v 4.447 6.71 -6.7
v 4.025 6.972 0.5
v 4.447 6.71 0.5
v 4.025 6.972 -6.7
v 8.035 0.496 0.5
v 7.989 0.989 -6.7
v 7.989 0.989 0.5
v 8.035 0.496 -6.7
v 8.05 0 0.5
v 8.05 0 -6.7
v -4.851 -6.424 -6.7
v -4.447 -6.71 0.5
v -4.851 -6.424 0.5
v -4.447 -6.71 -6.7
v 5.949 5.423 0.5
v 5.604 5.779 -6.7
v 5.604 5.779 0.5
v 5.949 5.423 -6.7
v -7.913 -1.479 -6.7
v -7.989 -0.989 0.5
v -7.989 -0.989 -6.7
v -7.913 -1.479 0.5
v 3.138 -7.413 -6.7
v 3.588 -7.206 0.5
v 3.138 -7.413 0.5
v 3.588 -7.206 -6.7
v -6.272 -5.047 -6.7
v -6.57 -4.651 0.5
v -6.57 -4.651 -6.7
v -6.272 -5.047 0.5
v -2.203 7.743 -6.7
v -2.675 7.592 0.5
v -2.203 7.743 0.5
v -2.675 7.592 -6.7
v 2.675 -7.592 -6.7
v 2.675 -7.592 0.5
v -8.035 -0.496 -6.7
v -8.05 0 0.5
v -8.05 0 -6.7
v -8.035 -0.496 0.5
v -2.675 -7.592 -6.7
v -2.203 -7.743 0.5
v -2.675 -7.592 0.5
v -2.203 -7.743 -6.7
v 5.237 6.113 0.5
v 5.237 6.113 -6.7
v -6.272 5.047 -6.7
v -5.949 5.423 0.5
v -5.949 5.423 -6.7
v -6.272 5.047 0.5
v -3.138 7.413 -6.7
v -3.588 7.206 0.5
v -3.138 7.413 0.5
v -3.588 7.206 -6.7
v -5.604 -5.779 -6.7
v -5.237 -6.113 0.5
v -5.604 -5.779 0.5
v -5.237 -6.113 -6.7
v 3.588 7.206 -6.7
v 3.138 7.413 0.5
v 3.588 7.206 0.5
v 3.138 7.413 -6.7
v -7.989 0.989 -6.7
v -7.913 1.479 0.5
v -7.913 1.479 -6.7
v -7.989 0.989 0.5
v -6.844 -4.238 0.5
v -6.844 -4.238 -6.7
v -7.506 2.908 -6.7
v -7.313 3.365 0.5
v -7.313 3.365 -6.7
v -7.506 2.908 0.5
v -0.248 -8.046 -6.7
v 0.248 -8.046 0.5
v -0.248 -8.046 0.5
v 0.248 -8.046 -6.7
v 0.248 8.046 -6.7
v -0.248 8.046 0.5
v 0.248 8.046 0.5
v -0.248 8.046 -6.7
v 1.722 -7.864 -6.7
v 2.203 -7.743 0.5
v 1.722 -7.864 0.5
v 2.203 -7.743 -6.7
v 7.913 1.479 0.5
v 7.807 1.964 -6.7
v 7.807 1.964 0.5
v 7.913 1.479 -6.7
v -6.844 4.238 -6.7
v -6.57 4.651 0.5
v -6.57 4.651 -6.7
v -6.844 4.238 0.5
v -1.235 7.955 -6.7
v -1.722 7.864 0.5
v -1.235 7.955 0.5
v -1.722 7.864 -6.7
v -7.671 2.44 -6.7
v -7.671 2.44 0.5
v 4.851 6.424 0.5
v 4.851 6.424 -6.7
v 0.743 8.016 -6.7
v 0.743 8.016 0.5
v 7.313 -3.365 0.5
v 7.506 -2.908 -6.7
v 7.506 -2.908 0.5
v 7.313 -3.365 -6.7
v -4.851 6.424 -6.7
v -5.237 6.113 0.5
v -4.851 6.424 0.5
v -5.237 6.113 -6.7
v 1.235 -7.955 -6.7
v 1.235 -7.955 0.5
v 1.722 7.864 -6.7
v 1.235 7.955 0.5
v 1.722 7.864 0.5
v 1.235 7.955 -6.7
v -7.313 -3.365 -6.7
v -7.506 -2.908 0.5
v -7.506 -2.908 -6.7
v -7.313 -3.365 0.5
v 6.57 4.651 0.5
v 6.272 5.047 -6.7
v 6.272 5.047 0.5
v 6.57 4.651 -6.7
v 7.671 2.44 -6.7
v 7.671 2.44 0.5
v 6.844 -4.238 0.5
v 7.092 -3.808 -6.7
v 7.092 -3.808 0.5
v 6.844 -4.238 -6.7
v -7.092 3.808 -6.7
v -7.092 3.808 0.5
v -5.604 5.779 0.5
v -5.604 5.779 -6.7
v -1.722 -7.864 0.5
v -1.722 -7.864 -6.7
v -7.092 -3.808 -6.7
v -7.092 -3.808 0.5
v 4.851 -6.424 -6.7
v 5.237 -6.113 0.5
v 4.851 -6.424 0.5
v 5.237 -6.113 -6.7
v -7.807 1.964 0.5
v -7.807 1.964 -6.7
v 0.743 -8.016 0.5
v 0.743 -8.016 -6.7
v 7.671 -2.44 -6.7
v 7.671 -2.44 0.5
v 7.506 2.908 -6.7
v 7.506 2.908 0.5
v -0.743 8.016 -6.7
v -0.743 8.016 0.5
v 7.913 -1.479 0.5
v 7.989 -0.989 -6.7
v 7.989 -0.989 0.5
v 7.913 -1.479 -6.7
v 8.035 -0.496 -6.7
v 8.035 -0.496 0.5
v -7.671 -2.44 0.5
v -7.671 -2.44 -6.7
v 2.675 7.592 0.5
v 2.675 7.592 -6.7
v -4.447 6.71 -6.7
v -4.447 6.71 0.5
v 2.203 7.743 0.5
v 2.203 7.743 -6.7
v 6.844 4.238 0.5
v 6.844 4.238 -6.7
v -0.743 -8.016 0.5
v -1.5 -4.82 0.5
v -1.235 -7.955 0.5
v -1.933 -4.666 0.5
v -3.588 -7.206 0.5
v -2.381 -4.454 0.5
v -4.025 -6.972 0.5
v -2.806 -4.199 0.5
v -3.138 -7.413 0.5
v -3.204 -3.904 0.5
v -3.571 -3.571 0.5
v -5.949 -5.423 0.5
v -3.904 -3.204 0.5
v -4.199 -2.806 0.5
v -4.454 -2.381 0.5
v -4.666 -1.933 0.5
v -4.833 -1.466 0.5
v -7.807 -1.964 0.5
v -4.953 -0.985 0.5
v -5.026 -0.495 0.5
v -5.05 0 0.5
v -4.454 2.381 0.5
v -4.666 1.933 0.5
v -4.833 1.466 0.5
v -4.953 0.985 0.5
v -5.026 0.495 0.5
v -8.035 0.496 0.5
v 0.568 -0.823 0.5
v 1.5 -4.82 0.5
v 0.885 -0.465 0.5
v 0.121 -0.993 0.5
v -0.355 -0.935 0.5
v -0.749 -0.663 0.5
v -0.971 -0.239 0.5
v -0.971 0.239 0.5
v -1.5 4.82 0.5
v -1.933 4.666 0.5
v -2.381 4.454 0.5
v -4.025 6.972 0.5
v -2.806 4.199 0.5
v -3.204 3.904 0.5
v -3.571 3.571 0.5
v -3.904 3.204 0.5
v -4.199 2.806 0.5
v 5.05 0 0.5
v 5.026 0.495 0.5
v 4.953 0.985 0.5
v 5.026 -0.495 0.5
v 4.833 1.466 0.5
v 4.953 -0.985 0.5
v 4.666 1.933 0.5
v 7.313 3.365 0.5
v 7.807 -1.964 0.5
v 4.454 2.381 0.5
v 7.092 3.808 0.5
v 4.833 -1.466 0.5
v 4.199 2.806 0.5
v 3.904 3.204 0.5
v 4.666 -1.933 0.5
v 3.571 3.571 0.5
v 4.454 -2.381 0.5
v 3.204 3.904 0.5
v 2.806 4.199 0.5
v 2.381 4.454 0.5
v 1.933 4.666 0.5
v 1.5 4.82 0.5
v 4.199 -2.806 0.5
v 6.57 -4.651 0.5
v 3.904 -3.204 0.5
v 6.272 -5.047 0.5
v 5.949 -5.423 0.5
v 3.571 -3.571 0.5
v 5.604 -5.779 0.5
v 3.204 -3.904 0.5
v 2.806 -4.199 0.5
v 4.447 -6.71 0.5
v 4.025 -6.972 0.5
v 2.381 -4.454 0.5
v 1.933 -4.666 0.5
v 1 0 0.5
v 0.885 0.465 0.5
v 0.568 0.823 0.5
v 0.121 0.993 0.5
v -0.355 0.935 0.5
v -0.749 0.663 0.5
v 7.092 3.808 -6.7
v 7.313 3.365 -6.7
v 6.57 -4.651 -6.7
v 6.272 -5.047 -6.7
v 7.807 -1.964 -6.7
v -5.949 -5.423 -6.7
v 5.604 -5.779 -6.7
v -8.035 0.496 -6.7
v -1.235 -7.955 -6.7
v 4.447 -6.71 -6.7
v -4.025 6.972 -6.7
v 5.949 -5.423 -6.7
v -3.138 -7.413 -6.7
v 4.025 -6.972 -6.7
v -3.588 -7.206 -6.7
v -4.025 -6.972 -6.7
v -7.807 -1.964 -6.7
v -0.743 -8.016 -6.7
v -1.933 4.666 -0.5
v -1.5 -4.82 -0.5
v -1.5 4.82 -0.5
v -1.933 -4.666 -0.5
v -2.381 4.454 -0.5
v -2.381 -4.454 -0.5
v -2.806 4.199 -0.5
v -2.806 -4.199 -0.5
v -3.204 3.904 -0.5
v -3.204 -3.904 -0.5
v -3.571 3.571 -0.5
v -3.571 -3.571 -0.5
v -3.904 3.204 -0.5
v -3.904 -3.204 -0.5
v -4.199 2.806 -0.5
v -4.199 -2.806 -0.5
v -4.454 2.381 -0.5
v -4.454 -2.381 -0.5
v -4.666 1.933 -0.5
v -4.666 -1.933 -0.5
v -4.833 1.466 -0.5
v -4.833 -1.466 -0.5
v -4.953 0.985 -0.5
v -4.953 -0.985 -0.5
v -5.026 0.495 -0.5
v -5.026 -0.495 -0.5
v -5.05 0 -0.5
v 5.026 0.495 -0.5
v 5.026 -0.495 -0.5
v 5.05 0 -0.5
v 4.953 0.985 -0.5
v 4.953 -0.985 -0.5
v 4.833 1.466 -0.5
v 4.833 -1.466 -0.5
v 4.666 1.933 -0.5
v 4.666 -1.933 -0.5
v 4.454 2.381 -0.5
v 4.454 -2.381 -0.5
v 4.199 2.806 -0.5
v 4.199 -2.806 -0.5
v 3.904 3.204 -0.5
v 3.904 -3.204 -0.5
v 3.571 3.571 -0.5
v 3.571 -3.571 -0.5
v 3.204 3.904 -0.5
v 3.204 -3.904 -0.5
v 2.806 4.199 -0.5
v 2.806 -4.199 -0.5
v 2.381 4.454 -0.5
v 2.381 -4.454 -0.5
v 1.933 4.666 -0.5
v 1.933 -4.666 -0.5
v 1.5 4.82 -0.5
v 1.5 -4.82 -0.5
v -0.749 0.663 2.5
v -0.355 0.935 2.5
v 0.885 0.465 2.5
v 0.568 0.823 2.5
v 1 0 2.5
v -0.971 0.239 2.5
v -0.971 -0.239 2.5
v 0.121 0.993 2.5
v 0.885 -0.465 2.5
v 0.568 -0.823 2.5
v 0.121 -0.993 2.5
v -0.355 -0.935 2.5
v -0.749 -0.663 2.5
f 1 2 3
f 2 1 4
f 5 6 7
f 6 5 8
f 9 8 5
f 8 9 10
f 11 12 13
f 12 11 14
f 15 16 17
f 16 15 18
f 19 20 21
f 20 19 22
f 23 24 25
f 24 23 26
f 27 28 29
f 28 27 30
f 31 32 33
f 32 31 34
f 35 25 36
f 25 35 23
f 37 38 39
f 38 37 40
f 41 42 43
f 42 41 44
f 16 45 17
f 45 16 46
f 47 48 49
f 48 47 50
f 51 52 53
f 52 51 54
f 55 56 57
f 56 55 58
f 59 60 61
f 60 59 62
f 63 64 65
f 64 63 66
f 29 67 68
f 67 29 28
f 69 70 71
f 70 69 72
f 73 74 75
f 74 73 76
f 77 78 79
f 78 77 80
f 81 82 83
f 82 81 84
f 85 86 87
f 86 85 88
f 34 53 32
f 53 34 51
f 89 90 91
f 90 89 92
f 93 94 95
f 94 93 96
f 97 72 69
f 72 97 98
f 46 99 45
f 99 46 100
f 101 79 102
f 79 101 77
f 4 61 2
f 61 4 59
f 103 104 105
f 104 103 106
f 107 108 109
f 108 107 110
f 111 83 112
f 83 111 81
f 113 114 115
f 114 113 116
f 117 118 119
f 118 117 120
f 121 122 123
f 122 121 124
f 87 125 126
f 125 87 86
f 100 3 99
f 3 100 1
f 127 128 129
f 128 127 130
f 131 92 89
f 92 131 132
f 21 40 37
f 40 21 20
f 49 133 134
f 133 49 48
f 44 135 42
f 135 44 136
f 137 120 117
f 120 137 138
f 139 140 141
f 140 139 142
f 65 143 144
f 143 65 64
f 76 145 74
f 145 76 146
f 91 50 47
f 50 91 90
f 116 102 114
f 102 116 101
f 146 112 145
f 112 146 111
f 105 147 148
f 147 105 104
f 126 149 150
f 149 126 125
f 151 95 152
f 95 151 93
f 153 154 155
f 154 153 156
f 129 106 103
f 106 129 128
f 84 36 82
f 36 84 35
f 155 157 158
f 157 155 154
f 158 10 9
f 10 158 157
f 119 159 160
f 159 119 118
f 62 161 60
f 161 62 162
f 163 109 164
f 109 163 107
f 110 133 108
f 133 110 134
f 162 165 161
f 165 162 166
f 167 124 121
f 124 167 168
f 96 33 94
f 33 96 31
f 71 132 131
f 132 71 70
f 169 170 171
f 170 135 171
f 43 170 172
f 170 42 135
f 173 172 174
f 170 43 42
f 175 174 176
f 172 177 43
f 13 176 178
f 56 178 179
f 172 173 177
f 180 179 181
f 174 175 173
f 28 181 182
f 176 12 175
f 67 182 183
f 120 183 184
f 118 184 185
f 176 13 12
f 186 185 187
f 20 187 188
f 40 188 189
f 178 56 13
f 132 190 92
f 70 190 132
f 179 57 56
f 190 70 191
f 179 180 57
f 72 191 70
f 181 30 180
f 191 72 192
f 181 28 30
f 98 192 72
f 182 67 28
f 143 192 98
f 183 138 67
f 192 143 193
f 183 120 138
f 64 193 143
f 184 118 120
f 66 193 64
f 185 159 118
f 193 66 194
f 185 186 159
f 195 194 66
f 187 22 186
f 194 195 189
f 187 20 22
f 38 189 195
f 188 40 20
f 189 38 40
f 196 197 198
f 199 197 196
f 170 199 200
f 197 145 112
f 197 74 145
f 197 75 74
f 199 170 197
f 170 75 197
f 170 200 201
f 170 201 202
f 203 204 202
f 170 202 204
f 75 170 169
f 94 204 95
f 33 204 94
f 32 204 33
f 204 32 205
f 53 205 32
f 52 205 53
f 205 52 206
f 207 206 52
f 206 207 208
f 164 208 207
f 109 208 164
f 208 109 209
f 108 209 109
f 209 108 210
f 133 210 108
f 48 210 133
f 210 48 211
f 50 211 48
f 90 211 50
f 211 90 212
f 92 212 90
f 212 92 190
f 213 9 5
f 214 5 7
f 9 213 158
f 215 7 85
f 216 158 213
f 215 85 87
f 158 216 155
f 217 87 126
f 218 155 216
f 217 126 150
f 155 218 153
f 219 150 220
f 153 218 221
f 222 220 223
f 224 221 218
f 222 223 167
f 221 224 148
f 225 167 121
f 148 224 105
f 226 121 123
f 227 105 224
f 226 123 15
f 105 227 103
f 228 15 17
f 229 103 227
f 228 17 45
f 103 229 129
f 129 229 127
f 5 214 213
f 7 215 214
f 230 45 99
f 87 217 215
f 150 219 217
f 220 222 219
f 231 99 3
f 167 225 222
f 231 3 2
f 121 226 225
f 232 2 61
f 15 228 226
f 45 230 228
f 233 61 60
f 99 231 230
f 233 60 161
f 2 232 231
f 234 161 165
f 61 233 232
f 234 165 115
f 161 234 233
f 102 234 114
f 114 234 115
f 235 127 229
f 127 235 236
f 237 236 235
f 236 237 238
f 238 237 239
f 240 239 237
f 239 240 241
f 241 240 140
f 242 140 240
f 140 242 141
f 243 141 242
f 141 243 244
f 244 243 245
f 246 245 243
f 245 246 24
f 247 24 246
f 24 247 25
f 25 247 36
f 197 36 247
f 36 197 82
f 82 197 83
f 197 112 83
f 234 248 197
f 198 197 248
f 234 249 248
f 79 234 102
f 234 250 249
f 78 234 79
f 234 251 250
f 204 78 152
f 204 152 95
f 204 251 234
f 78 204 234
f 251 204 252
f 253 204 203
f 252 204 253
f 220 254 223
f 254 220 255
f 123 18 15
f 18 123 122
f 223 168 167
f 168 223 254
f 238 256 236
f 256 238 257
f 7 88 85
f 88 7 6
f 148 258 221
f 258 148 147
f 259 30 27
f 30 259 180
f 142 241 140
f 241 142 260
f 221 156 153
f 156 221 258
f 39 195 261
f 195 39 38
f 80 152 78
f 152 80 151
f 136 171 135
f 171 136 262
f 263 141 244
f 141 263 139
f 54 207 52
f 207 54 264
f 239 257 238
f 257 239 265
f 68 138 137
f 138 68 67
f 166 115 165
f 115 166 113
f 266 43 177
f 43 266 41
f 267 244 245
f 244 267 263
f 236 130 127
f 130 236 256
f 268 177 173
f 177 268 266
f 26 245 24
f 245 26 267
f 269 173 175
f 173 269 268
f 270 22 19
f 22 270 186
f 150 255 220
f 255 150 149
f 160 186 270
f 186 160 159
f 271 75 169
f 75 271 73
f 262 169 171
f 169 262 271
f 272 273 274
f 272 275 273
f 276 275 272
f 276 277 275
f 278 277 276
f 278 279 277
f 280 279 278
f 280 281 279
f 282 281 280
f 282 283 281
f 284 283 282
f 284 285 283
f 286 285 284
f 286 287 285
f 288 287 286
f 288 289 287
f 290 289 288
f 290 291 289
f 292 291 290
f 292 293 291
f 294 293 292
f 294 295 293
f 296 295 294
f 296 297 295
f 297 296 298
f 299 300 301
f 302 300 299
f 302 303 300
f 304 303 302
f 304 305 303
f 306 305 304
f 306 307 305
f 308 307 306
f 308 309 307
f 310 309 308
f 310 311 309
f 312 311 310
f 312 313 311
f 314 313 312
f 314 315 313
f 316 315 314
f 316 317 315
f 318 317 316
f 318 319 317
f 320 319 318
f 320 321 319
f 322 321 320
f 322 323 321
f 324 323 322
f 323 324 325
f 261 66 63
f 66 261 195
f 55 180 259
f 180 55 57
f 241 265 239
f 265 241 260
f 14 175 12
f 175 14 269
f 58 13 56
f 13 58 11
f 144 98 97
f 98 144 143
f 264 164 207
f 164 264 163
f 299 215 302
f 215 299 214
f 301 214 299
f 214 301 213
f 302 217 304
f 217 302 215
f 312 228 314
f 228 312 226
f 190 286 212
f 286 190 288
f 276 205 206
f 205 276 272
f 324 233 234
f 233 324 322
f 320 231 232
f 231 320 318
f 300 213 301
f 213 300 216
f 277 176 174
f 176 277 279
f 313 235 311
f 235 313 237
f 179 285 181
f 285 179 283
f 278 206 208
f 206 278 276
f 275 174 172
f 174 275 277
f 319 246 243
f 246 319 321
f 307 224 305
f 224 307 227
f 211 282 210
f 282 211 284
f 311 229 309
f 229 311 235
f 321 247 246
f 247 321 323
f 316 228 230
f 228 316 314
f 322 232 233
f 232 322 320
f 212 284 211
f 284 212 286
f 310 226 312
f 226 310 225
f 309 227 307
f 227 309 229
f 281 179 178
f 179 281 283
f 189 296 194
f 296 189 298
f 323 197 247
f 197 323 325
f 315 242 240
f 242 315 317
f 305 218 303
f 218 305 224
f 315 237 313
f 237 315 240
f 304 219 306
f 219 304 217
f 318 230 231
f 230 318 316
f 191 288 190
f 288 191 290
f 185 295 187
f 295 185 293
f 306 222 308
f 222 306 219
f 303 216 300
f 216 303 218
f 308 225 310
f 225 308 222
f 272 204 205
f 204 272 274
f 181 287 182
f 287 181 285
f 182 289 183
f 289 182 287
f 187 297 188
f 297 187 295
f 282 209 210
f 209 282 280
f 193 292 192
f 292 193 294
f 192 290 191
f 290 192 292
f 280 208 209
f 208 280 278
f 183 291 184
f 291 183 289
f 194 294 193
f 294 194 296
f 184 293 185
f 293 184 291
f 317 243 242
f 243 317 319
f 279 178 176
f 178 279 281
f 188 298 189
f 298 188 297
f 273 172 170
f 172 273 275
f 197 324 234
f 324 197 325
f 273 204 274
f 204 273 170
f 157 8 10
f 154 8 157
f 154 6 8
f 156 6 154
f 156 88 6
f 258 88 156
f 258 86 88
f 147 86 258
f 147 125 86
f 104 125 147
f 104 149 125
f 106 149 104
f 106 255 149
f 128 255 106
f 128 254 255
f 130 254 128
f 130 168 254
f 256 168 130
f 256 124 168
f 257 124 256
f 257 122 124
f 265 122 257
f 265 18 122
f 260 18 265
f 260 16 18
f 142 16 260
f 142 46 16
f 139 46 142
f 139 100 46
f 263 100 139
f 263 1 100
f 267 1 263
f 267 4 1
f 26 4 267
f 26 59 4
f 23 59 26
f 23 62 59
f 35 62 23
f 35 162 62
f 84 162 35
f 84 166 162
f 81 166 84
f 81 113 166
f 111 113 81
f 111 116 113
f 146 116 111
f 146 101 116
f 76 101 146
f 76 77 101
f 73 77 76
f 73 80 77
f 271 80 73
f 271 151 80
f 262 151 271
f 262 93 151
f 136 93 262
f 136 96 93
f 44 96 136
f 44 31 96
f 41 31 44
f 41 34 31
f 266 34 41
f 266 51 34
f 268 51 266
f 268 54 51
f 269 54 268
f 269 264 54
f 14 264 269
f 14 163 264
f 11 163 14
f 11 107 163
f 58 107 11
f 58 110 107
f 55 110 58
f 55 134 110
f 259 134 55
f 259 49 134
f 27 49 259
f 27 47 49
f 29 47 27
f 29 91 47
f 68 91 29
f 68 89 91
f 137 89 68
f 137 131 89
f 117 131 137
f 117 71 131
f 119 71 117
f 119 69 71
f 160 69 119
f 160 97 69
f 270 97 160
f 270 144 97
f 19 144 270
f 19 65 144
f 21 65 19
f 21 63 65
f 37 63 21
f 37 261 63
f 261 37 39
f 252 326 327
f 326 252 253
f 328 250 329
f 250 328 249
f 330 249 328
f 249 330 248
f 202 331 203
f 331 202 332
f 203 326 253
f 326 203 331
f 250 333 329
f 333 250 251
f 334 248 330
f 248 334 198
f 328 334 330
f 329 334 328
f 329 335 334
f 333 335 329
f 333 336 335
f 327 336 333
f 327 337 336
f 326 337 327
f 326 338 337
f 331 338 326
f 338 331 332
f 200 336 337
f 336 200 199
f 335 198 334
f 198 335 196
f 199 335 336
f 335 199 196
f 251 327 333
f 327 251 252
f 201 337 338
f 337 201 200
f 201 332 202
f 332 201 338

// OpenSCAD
$fa=0.01;
$fs=0.5;

module capsuleCover() {
	cylinder(r=16.1/2, h=6.2,center=true);
}

//translate([0,0,-3.6])

module backPlate() {
	color([0,1,0])
	union() {
		difference() {
			cylinder(r=16.1/2, h=1,center=true);
			cylinder(r=(16.1/2)-3, h=1.5,center=true);
		}
	cube([3.,11,1],center=true);
	}	
}

module terminals() {
	union() {
		cylinder(r=1,h=2.5);
	}
}

module tsb160aElement() {
	translate([0,0,-3.6])
	capsuleCover();
	backPlate();
	terminals();	
}

tsb160aElement();

//for (i=1:6) {
//	translate([4,0,0])
//	rotate([])
//}
